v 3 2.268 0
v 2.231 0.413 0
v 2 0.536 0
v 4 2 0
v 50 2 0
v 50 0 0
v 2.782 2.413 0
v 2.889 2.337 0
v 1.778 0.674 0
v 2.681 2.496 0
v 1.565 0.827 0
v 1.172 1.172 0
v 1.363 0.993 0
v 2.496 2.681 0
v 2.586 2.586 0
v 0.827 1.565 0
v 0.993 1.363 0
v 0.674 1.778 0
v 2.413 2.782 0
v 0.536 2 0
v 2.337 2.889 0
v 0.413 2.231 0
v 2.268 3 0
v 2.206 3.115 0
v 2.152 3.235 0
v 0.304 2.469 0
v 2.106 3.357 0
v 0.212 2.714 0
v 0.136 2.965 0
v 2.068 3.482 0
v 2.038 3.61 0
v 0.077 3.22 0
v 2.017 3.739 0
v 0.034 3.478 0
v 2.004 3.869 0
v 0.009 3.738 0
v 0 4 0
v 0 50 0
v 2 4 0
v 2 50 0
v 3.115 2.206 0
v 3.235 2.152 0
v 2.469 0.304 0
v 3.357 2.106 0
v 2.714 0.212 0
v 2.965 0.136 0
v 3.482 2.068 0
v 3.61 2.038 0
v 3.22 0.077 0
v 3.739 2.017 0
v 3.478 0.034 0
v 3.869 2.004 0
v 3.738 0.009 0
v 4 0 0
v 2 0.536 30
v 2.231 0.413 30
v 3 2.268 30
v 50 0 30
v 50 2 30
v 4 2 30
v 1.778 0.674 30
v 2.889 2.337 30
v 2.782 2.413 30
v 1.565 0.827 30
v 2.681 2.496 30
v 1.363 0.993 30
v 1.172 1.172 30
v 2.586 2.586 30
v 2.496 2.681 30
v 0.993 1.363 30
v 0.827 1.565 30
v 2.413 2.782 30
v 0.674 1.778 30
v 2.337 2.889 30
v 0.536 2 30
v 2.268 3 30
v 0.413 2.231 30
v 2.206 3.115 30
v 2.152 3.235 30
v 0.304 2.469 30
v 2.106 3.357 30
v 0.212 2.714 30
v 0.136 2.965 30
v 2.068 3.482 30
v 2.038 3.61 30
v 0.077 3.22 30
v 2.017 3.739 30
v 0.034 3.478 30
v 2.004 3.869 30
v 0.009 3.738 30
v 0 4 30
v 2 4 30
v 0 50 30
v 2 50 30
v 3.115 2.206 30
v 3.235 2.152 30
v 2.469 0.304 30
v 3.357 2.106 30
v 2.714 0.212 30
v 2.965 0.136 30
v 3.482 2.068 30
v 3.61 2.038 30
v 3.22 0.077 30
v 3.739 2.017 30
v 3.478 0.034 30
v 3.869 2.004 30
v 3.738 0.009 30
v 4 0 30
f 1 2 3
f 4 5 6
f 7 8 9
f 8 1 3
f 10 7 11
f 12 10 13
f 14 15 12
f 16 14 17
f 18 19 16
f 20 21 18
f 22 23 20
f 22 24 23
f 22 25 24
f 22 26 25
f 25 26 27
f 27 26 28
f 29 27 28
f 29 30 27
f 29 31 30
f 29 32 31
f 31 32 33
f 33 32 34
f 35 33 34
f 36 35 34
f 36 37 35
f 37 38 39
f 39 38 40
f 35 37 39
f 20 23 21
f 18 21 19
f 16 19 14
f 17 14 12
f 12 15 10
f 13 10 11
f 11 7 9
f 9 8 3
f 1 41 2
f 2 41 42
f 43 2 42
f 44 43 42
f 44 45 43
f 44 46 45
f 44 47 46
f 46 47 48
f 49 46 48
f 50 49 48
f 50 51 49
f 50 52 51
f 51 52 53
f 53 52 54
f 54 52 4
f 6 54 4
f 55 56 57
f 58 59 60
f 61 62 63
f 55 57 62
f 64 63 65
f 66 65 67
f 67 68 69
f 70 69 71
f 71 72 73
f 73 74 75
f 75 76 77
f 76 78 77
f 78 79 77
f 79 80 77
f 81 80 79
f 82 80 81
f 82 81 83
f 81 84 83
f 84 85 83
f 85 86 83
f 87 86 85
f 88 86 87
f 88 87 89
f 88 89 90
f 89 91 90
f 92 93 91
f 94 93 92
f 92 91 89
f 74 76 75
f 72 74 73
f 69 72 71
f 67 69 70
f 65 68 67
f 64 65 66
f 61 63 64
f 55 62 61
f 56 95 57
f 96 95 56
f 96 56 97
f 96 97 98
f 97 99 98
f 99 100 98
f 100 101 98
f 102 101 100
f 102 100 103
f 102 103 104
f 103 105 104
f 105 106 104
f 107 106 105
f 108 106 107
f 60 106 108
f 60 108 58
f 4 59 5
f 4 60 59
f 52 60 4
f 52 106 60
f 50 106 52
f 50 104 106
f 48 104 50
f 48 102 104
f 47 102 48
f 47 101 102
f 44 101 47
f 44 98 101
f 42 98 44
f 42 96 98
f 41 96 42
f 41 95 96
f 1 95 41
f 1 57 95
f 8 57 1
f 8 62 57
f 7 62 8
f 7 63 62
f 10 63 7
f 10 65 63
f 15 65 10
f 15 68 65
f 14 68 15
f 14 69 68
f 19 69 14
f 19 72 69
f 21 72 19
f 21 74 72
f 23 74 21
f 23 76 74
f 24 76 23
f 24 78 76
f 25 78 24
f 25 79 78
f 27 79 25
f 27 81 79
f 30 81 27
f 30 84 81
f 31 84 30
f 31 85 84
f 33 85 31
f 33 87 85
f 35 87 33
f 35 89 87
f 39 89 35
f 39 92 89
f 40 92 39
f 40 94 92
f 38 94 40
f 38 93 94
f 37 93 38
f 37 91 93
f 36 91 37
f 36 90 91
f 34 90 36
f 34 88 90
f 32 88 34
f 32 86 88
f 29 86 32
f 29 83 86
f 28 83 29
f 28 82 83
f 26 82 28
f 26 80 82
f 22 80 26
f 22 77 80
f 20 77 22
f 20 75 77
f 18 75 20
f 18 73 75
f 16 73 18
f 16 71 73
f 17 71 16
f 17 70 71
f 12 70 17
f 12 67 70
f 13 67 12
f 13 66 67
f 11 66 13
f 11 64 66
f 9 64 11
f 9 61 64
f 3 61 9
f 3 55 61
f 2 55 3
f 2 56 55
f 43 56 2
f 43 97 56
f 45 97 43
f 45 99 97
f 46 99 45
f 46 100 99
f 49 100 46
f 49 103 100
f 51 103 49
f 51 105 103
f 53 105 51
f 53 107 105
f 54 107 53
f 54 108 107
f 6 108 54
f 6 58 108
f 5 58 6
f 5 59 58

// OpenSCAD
thickness_mm = 2.0;
bend_radius_mm = 2.0;
outside_length_a_mm = 50.0;
outside_length_b_mm = 50.0;
width_mm = 30.0;
bend_angle_deg = 90.0;
k_factor = 0.45;
$fn = 96;

outer_radius_mm = bend_radius_mm + thickness_mm;
bend_center = [outer_radius_mm, outer_radius_mm];

angle_rad = bend_angle_deg * PI / 180.0;
setback_mm = tan(bend_angle_deg / 2.0) * (bend_radius_mm + thickness_mm);
bend_allowance_mm = angle_rad * (bend_radius_mm + k_factor * thickness_mm);
flat_length_mm = outside_length_a_mm + outside_length_b_mm - 2.0 * setback_mm + bend_allowance_mm;

function arc_points(center, radius, start_deg, end_deg, segments) =
    [for (i = [0 : segments])
        let(a = start_deg + (end_deg - start_deg) * i / segments)
        [center[0] + radius * cos(a), center[1] + radius * sin(a)]
    ];

module l_bracket() {
    linear_extrude(height = width_mm, convexity = 10)
        polygon(points = concat(
            [[0, outside_length_b_mm]],
            arc_points(bend_center, outer_radius_mm, 180, 270, 24),
            [[outside_length_a_mm, 0], [outside_length_a_mm, thickness_mm]],
            arc_points(bend_center, bend_radius_mm, 270, 180, 24),
            [[thickness_mm, outside_length_b_mm]]
        ));
}

echo(str(
    "MAKERBENCH-SHEETMETAL: {\"thickness_mm\": ",
    thickness_mm,
    ", \"bend_radius_mm\": ",
    bend_radius_mm,
    ", \"flat_length_mm\": ",
    flat_length_mm,
    "}"
));

l_bracket();
